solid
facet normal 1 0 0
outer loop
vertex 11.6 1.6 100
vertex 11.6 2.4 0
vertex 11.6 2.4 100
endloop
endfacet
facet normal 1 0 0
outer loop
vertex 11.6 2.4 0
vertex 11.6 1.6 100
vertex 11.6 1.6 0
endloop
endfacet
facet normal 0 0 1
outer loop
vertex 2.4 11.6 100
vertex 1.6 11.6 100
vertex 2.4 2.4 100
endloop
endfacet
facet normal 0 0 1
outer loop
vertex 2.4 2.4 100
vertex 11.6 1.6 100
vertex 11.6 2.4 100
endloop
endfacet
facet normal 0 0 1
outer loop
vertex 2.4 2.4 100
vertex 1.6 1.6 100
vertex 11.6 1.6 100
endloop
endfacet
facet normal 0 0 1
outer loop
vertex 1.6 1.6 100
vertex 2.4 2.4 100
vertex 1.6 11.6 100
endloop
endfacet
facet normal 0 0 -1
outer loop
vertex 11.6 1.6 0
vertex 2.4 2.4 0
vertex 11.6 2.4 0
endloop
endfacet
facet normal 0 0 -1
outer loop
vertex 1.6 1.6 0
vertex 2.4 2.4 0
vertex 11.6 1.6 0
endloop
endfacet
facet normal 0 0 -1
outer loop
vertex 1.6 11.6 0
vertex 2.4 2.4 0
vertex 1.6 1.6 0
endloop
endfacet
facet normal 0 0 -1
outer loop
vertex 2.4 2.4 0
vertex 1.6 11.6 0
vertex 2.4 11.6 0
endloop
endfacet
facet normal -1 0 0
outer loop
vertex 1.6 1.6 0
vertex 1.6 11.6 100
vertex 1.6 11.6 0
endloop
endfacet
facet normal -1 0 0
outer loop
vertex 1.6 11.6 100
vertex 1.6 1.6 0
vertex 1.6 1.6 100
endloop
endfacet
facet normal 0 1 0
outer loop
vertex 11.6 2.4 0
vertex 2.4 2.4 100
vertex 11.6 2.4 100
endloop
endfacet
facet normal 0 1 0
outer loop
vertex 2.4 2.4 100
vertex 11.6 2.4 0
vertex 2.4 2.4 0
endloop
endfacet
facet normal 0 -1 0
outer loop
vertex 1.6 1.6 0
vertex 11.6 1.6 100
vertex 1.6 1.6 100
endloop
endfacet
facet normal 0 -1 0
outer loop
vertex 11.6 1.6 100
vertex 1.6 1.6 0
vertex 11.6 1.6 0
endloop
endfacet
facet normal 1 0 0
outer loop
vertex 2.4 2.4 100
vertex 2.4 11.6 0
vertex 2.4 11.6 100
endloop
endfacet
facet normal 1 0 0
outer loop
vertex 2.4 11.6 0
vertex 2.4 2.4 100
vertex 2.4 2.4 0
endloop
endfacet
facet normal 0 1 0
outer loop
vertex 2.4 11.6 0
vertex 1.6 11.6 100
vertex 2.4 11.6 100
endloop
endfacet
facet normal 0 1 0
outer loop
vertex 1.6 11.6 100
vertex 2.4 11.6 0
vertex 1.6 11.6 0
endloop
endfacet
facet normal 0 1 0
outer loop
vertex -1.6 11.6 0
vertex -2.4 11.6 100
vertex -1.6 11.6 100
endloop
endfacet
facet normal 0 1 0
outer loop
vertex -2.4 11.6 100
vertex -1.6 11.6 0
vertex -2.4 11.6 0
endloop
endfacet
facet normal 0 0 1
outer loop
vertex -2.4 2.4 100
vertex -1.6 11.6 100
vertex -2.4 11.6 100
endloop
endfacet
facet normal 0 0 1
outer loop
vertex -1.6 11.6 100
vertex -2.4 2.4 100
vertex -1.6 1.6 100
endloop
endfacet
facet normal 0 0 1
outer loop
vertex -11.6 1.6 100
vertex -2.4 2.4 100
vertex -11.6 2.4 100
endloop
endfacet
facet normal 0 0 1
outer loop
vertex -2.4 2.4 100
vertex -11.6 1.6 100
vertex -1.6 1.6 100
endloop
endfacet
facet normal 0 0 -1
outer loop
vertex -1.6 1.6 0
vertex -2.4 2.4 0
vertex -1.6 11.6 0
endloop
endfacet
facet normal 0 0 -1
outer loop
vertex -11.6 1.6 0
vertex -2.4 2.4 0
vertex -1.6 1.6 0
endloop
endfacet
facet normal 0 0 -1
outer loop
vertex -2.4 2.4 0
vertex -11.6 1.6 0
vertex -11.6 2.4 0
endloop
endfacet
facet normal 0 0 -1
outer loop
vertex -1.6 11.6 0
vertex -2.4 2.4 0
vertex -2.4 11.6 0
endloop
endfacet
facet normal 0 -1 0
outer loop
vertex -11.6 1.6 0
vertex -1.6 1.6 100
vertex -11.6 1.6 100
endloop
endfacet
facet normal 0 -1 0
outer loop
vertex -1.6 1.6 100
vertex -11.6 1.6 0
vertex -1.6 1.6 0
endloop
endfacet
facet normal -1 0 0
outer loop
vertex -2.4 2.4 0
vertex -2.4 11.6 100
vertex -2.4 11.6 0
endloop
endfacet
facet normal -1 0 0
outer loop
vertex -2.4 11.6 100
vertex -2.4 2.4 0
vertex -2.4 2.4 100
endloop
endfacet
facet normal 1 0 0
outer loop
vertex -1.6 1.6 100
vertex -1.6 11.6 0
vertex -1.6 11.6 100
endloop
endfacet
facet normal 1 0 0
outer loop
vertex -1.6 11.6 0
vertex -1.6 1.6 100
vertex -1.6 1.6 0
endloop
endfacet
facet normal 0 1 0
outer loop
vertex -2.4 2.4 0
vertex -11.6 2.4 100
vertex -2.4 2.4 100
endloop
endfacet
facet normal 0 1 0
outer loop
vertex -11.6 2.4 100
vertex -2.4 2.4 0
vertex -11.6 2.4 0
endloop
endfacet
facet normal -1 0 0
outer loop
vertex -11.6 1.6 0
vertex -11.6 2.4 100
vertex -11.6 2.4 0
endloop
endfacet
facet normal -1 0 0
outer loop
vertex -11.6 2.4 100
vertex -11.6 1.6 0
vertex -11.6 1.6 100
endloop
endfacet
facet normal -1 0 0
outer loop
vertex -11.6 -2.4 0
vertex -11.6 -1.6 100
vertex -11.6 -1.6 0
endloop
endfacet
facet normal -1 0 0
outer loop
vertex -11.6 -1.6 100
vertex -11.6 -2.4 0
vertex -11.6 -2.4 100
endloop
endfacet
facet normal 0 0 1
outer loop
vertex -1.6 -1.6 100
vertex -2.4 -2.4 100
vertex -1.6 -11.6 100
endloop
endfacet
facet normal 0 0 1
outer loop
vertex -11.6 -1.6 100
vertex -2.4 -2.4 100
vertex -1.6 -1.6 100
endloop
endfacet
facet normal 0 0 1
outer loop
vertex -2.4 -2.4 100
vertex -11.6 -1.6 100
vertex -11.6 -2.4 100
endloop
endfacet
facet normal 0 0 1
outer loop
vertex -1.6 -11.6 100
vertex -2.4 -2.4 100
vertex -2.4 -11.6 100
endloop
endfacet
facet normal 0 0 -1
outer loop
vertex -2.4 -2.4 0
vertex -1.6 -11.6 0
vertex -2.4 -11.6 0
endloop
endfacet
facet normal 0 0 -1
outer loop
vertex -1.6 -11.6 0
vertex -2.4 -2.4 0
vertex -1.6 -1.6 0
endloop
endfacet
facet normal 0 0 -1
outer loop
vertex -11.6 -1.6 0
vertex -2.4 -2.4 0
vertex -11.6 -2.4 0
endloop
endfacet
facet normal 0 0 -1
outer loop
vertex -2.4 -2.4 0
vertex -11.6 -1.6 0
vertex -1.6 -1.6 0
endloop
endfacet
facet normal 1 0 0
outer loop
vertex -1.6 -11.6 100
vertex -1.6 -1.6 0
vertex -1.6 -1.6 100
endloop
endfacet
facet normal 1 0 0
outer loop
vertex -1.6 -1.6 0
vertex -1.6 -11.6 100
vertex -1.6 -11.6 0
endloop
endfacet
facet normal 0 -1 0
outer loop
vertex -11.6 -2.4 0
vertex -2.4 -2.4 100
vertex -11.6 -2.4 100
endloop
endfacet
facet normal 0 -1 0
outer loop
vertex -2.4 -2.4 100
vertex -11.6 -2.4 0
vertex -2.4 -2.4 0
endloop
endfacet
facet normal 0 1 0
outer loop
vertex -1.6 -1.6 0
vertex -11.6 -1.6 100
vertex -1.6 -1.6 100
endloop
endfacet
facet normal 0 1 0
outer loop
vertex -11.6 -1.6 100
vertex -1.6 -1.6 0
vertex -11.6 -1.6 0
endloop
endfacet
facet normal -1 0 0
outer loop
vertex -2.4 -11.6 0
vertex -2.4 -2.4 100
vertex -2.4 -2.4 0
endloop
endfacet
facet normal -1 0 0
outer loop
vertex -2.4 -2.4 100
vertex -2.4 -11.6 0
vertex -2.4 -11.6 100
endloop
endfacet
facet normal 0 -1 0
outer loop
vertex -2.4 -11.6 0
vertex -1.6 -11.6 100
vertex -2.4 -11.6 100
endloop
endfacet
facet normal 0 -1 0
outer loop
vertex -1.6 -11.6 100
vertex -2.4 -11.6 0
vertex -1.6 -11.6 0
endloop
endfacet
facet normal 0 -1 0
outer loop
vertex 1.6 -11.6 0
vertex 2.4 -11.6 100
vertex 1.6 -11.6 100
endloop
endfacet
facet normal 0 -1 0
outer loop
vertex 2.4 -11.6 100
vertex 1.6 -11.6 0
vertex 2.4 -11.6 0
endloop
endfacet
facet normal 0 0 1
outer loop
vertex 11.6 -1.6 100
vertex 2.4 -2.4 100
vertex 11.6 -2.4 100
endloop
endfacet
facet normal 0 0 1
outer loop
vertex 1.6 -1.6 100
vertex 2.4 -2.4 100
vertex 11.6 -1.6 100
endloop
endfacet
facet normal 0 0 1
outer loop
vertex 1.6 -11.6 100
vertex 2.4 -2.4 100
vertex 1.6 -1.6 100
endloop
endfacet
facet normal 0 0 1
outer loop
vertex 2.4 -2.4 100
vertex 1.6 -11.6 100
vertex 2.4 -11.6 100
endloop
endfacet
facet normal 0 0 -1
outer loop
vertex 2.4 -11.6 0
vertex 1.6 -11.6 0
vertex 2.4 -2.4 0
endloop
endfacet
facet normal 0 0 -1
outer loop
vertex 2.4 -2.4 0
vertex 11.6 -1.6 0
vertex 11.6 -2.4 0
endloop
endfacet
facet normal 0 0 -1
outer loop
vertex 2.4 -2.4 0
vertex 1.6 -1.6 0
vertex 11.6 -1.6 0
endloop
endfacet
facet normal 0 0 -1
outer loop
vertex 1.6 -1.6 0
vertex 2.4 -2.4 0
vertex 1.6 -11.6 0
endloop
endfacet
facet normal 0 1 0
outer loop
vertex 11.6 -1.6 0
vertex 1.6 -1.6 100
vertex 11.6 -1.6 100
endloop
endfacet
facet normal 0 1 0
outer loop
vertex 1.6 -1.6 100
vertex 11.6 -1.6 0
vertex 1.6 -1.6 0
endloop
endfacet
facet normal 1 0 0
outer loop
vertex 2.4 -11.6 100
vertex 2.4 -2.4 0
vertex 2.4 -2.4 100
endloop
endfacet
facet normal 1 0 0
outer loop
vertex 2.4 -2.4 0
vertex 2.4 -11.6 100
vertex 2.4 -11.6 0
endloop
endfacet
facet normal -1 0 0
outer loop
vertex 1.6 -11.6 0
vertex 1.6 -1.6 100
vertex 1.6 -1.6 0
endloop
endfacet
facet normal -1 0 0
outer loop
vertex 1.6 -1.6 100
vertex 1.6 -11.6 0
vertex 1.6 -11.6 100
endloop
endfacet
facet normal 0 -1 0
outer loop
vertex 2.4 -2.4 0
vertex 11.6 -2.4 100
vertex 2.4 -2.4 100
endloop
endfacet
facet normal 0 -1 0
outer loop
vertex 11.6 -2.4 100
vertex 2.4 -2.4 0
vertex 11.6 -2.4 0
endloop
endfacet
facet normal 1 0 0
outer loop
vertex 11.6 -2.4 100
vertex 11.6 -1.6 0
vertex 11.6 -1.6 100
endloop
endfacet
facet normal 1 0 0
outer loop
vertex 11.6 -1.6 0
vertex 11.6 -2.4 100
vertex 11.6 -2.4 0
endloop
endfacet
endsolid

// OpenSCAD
// -*- mode: SCAD ; c-file-style: "ellemtel" ; coding: utf-8 -*-
//
// NN
//
// (c) 2017 Roland Sieker <ospalh@gmail.com>
// Licence: CC-BY-SA 4.0

w = 0.8;

l1 = 10;
l2 = 10;
h = 100;


for (i=[0:90:271])
{
   rotate(i)
   {
      one_profile();
   }
}

module one_profile()
{
   translate([2*w,2*w,0])
   {
      cube([l1,w,h]);
      cube([w,l2,h]);
   }
}
